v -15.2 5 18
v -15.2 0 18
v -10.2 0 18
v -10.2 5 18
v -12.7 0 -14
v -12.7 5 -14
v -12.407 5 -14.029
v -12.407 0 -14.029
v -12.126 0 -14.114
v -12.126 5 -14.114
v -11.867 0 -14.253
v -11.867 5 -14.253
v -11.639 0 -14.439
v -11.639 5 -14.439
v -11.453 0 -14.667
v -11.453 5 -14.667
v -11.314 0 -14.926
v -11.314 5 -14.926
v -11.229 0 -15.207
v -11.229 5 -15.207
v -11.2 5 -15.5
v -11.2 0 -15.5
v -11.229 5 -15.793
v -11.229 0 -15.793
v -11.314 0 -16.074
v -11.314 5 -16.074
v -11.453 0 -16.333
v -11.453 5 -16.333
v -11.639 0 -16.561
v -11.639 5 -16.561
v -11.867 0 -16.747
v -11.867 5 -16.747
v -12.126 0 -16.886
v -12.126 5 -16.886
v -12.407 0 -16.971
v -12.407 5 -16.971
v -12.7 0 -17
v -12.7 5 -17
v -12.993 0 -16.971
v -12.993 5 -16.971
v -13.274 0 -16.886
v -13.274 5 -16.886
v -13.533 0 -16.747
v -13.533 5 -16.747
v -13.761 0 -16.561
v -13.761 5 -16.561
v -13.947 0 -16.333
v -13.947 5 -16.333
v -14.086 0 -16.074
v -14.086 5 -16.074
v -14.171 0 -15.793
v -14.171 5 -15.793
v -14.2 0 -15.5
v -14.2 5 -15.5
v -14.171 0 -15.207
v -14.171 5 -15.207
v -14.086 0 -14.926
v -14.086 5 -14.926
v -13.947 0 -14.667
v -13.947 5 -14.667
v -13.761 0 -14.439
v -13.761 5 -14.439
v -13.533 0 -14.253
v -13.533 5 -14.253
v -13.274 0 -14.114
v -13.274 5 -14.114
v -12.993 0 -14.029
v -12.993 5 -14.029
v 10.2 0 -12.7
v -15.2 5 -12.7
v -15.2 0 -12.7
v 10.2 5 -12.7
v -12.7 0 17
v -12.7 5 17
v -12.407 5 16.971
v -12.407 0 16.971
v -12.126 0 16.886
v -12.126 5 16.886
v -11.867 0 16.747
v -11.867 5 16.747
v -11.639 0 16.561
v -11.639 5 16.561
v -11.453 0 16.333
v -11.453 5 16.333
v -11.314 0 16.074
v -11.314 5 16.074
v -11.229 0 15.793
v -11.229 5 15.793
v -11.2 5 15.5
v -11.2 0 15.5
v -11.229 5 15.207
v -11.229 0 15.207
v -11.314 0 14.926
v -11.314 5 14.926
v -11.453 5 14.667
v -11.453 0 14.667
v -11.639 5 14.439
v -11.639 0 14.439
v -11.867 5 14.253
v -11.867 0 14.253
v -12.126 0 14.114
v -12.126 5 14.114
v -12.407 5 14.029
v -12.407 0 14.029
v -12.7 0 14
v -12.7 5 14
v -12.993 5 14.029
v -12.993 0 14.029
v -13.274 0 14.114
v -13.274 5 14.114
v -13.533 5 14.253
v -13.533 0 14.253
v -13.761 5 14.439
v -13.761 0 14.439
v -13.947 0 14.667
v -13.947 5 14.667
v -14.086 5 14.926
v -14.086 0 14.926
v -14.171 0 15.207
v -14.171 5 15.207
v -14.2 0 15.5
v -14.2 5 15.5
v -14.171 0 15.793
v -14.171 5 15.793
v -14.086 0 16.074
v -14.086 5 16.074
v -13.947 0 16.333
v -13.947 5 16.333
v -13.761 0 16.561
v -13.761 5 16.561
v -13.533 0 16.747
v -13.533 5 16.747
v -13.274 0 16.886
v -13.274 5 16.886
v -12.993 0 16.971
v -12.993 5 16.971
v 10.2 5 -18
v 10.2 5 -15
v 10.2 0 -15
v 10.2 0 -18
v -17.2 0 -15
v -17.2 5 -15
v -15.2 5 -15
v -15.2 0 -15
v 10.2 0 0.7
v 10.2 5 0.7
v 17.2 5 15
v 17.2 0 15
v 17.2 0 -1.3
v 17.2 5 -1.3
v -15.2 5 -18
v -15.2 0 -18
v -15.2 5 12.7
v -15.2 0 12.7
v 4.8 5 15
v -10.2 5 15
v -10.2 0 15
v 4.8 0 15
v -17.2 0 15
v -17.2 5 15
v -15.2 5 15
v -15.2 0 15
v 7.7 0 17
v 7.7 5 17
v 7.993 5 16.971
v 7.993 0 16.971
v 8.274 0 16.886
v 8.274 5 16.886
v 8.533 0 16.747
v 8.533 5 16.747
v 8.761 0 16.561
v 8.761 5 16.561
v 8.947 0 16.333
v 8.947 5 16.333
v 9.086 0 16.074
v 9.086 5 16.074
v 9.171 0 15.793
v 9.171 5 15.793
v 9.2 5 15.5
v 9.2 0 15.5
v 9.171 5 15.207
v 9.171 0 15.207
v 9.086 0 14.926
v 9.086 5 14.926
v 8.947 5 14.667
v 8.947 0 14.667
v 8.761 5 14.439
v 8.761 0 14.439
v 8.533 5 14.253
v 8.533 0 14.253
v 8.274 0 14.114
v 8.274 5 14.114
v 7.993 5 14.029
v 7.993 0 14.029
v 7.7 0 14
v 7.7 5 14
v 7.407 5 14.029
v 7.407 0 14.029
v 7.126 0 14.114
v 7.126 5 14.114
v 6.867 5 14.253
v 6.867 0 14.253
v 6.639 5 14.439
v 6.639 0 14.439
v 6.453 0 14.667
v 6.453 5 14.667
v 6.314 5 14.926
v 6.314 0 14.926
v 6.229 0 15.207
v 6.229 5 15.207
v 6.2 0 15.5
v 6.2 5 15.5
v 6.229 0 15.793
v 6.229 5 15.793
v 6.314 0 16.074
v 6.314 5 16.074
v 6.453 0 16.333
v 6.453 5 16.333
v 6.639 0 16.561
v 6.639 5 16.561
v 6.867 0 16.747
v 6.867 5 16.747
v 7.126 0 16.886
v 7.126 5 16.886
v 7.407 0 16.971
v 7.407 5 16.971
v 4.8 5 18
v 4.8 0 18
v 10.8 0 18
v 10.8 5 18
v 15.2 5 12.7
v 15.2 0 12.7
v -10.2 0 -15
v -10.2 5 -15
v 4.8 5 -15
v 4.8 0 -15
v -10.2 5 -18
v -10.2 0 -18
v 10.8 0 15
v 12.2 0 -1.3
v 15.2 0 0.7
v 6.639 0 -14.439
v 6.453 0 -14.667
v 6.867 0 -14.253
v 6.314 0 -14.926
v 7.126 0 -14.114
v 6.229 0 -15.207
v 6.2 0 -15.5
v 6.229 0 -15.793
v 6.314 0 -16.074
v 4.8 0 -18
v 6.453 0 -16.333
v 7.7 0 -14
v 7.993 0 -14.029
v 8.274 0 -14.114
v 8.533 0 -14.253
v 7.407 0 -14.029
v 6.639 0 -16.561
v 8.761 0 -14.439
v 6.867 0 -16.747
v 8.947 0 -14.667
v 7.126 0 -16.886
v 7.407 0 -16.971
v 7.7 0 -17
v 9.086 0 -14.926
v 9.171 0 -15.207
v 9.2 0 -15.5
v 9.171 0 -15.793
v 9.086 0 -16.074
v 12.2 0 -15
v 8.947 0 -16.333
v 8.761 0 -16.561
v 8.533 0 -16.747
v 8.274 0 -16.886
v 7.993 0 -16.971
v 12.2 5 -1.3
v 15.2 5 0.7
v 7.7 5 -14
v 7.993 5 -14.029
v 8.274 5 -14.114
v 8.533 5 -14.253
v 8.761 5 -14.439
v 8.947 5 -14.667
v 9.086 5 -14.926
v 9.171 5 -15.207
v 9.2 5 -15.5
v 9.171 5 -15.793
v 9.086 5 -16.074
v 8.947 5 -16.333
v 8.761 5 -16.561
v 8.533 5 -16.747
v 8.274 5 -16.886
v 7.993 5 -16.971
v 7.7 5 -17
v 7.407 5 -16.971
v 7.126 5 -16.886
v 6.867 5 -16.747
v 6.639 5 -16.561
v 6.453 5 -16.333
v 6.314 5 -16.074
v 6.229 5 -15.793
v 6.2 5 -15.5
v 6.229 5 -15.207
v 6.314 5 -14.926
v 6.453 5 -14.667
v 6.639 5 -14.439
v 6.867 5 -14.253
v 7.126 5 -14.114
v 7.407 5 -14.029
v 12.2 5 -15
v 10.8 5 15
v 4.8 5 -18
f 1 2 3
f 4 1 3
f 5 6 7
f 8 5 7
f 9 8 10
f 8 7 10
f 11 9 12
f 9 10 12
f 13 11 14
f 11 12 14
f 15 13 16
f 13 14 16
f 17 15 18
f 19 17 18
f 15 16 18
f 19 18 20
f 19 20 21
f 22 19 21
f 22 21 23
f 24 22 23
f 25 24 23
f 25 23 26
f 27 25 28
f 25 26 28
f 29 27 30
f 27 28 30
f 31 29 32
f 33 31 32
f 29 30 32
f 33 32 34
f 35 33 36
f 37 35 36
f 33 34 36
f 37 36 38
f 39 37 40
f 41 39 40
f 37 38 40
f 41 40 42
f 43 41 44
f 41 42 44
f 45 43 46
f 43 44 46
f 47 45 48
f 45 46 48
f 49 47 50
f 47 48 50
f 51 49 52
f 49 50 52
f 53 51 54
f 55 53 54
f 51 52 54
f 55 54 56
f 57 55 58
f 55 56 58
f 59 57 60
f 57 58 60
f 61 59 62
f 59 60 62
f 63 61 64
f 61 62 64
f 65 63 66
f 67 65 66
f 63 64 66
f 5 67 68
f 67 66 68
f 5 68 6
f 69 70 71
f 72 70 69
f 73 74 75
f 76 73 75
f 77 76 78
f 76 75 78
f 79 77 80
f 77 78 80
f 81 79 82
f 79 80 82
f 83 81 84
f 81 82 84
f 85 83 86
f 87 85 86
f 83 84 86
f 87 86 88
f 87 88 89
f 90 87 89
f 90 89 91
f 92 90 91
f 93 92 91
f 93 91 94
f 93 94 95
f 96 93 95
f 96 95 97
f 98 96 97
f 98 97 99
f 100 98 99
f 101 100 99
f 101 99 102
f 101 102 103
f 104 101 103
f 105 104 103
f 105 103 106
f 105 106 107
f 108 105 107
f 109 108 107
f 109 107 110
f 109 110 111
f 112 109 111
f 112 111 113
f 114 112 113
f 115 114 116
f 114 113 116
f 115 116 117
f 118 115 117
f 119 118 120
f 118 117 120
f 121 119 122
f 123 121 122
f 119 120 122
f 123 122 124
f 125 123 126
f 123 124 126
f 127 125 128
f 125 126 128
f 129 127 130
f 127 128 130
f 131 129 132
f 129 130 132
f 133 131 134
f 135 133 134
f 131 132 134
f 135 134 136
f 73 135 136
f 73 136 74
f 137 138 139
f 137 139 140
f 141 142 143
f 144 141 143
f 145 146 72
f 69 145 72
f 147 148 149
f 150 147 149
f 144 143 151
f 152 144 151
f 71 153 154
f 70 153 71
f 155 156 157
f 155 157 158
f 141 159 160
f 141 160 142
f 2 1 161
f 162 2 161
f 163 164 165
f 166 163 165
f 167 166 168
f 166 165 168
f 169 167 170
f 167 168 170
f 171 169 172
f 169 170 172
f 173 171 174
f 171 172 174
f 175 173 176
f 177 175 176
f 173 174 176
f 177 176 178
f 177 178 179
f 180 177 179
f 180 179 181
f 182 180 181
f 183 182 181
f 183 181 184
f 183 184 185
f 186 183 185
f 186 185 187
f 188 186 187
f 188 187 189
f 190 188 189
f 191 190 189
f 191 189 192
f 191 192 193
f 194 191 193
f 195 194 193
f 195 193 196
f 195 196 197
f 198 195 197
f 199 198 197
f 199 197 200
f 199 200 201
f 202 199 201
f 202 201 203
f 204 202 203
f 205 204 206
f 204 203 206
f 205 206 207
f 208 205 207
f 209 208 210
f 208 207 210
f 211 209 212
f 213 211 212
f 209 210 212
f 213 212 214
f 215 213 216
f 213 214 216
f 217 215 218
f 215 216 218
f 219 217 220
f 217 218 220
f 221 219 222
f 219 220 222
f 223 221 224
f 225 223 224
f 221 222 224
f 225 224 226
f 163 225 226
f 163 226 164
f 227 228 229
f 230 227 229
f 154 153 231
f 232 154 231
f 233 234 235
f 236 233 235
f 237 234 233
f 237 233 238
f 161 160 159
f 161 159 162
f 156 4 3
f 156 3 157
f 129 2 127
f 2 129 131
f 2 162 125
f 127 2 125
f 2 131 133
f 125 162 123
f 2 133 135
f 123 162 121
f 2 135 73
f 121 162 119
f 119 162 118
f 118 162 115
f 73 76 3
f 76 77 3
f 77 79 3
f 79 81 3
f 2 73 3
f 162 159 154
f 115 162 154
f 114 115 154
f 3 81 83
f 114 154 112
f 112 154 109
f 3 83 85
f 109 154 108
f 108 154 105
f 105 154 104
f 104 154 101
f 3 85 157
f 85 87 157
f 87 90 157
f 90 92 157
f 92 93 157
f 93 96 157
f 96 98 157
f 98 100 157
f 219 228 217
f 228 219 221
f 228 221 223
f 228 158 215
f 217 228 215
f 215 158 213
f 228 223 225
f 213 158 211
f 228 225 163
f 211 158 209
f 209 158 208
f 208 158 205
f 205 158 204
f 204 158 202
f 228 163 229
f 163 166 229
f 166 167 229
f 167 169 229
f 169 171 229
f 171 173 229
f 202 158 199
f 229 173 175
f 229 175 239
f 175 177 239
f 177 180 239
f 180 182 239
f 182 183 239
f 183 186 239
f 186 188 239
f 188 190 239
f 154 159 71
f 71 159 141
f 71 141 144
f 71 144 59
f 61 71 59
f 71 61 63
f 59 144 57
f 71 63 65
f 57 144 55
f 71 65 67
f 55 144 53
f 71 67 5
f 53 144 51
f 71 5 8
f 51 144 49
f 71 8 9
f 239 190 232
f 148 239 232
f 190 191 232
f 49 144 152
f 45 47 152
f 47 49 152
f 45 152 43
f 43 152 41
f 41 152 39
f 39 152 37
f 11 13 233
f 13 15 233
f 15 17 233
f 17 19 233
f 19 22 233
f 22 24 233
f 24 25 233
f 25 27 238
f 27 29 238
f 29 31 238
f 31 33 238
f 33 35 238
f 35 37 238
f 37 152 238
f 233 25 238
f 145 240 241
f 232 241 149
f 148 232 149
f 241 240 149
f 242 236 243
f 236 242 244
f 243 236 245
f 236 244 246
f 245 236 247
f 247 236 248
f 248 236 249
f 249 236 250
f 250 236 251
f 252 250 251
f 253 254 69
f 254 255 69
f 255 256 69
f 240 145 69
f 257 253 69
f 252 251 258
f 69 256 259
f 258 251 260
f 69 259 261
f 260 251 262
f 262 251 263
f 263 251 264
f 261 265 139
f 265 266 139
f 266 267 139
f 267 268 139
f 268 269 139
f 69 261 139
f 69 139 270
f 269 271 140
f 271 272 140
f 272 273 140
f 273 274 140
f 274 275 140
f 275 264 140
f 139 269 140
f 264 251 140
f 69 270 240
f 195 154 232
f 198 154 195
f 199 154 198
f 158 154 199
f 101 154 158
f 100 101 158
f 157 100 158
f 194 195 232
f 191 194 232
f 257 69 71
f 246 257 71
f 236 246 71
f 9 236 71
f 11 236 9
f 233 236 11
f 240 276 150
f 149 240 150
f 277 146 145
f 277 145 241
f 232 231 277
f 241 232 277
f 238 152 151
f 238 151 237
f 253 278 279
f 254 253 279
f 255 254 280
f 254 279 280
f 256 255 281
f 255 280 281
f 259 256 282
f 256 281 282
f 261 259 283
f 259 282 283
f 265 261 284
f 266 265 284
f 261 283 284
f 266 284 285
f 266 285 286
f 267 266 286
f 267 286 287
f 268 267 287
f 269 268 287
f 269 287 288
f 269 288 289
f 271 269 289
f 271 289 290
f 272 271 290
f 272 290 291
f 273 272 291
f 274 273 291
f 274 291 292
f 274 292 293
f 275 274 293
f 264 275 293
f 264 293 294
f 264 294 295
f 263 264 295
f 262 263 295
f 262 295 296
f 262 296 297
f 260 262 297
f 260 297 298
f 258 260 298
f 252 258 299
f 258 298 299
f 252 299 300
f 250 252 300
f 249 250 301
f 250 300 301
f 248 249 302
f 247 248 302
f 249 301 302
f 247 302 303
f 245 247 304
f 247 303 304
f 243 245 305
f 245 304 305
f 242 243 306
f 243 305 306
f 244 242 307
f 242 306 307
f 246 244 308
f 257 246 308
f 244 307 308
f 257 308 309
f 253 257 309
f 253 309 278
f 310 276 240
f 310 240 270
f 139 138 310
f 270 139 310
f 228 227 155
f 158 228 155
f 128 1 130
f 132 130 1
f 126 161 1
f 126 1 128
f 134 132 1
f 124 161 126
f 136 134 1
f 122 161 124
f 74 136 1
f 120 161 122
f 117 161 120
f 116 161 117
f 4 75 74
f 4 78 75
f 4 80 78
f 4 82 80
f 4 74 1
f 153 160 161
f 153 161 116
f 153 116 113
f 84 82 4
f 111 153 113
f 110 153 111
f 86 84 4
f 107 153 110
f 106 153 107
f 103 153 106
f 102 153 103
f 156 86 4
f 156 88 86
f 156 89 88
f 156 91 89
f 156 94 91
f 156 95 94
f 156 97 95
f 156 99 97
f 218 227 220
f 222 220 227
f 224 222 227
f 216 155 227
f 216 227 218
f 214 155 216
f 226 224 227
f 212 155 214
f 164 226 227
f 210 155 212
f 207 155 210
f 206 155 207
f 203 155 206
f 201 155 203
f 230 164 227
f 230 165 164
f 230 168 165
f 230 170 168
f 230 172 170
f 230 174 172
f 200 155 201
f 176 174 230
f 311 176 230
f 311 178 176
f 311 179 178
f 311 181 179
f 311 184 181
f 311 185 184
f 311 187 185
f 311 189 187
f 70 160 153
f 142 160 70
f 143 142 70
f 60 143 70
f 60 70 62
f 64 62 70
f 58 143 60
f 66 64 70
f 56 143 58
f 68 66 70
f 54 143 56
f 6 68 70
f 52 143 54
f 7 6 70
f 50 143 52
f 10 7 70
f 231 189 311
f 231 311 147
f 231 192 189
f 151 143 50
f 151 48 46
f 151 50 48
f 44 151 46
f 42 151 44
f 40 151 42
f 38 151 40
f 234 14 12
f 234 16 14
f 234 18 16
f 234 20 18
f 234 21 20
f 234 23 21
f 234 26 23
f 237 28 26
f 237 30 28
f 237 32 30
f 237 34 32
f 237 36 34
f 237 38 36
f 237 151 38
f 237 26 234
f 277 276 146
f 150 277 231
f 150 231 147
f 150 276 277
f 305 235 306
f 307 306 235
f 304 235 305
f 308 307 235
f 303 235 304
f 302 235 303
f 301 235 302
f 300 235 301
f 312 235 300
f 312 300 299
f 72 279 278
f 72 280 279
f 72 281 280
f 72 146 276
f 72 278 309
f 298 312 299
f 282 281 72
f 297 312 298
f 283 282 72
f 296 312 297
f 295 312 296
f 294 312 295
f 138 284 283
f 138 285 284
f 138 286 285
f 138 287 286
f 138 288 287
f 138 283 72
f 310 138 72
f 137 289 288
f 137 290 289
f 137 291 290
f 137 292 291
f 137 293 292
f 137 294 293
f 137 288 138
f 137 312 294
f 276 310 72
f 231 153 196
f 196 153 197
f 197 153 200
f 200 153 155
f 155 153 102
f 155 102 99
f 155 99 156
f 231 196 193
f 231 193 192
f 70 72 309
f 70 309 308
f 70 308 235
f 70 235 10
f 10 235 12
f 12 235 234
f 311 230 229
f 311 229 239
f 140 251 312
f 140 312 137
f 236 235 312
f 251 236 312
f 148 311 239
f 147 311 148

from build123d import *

# Parameters (mm, degrees)
SKETCH1_W           = 34.4
SKETCH1_H           = 36
BOSS_EXTRUDE1_DEPTH = 5
SKETCH4_R           = 1.5
CUT_EXTRUDE2_DEPTH  = 5
SKETCH4_3_R         = 1.5
SKETCH4_3_W         = 25.4
SKETCH4_3_H         = 25.4
CUT_EXTRUDE3_DEPTH  = 26.393700006
SKETCH7_W           = 5
SKETCH7_H           = 12
CUT_EXTRUDE4_DEPTH  = 5
SKETCH8_W           = 15
SKETCH8_H           = 3
CUT_EXTRUDE5_DEPTH  = 26.393700006
SKETCH9_W           = 6.4
SKETCH9_H           = 3
CUT_EXTRUDE6_DEPTH  = 26.393700006
SKETCH10_W          = 2
SKETCH10_H          = 3
CUT_EXTRUDE7_DEPTH  = 26.393700006
SKETCH11_W          = 2
SKETCH11_H          = 3
SKETCH11_W_2        = 15
CUT_EXTRUDE8_DEPTH  = 26.393700006
SKETCH12_W          = 5
SKETCH12_H          = 16.7
CUT_EXTRUDE9_DEPTH  = 26.393700006
SKETCH13_W          = 2
SKETCH13_H          = 3
CUT_EXTRUDE10_DEPTH = 26.393700006


with BuildPart() as part:
    # Sketch1 → Boss-Extrude1 (new body)
    with BuildSketch(Plane(origin=(0, 0, 0), x_dir=(1, 0, 0), z_dir=(0, 1, 0))):
        Rectangle(SKETCH1_W, SKETCH1_H)
    extrude(amount=BOSS_EXTRUDE1_DEPTH)

    # Sketch4 → Cut-Extrude2 (cut)
    with BuildSketch(Plane(origin=(0, 5, 0), x_dir=(1, 0, 0), z_dir=(0, 1, 0))):
        with Locations((-12.7, 15.5)):
            Circle(SKETCH4_R)
    extrude(amount=-CUT_EXTRUDE2_DEPTH, mode=Mode.SUBTRACT)

    # Sketch4<3> → Cut-Extrude3 (cut, through all)
    with BuildSketch(Plane(origin=(0, 5, 0), x_dir=(1, 0, 0), z_dir=(0, 1, 0))):
        with Locations((-12.7, 15.5)):
            Circle(SKETCH4_3_R)
        with Locations((7.7, 15.5)):
            Circle(SKETCH4_3_R)
        with Locations((7.7, -15.5)):
            Circle(SKETCH4_3_R)
        with Locations((-12.7, -15.5)):
            Circle(SKETCH4_3_R)
        with Locations((-2.5, 0)):
            Rectangle(SKETCH4_3_W, SKETCH4_3_H)
    extrude(amount=-CUT_EXTRUDE3_DEPTH, mode=Mode.SUBTRACT)

    # Sketch7 → Cut-Extrude4 (cut)
    with BuildSketch(Plane(origin=(0, 5, 0), x_dir=(1, 0, 0), z_dir=(0, 1, 0))):
        with Locations((12.7, -6.7)):
            Rectangle(SKETCH7_W, SKETCH7_H)
    extrude(amount=-CUT_EXTRUDE4_DEPTH, mode=Mode.SUBTRACT)

    # Sketch8 → Cut-Extrude5 (cut, through all)
    with BuildSketch(Plane(origin=(0, 5, 0), x_dir=(1, 0, 0), z_dir=(0, 1, 0))):
        with Locations((-2.7, -16.5)):
            Rectangle(SKETCH8_W, SKETCH8_H)
    extrude(amount=-CUT_EXTRUDE5_DEPTH, mode=Mode.SUBTRACT)

    # Sketch9 → Cut-Extrude6 (cut, through all)
    with BuildSketch(Plane(origin=(0, 5, 0), x_dir=(1, 0, 0), z_dir=(0, 1, 0))):
        with Locations((14, -16.5)):
            Rectangle(SKETCH9_W, SKETCH9_H)
    extrude(amount=-CUT_EXTRUDE6_DEPTH, mode=Mode.SUBTRACT)

    # Sketch10 → Cut-Extrude7 (cut, through all)
    with BuildSketch(Plane(origin=(0, 5, 0), x_dir=(1, 0, 0), z_dir=(0, 1, 0))):
        with Locations((-16.2, -16.5)):
            Rectangle(SKETCH10_W, SKETCH10_H)
    extrude(amount=-CUT_EXTRUDE7_DEPTH, mode=Mode.SUBTRACT)

    # Sketch11 → Cut-Extrude8 (cut, through all)
    with BuildSketch(Plane(origin=(0, 5, 0), x_dir=(1, 0, 0), z_dir=(0, 1, 0))):
        with Locations((-16.2, 16.5)):
            Rectangle(SKETCH11_W, SKETCH11_H)
        with Locations((-2.7, 16.5)):
            Rectangle(SKETCH11_W_2, SKETCH11_H)
    extrude(amount=-CUT_EXTRUDE8_DEPTH, mode=Mode.SUBTRACT)

    # Sketch12 → Cut-Extrude9 (cut, through all)
    with BuildSketch(Plane(origin=(0, 5, 0), x_dir=(1, 0, 0), z_dir=(0, 1, 0))):
        with Locations((14.7, 9.65)):
            Rectangle(SKETCH12_W, SKETCH12_H)
    extrude(amount=-CUT_EXTRUDE9_DEPTH, mode=Mode.SUBTRACT)

    # Sketch13 → Cut-Extrude10 (cut, through all)
    with BuildSketch(Plane(origin=(0, 5, 0), x_dir=(1, 0, 0), z_dir=(0, 1, 0))):
        with Locations((11.2, 16.5)):
            Rectangle(SKETCH13_W, SKETCH13_H)
    extrude(amount=-CUT_EXTRUDE10_DEPTH, mode=Mode.SUBTRACT)


solid = part.part
